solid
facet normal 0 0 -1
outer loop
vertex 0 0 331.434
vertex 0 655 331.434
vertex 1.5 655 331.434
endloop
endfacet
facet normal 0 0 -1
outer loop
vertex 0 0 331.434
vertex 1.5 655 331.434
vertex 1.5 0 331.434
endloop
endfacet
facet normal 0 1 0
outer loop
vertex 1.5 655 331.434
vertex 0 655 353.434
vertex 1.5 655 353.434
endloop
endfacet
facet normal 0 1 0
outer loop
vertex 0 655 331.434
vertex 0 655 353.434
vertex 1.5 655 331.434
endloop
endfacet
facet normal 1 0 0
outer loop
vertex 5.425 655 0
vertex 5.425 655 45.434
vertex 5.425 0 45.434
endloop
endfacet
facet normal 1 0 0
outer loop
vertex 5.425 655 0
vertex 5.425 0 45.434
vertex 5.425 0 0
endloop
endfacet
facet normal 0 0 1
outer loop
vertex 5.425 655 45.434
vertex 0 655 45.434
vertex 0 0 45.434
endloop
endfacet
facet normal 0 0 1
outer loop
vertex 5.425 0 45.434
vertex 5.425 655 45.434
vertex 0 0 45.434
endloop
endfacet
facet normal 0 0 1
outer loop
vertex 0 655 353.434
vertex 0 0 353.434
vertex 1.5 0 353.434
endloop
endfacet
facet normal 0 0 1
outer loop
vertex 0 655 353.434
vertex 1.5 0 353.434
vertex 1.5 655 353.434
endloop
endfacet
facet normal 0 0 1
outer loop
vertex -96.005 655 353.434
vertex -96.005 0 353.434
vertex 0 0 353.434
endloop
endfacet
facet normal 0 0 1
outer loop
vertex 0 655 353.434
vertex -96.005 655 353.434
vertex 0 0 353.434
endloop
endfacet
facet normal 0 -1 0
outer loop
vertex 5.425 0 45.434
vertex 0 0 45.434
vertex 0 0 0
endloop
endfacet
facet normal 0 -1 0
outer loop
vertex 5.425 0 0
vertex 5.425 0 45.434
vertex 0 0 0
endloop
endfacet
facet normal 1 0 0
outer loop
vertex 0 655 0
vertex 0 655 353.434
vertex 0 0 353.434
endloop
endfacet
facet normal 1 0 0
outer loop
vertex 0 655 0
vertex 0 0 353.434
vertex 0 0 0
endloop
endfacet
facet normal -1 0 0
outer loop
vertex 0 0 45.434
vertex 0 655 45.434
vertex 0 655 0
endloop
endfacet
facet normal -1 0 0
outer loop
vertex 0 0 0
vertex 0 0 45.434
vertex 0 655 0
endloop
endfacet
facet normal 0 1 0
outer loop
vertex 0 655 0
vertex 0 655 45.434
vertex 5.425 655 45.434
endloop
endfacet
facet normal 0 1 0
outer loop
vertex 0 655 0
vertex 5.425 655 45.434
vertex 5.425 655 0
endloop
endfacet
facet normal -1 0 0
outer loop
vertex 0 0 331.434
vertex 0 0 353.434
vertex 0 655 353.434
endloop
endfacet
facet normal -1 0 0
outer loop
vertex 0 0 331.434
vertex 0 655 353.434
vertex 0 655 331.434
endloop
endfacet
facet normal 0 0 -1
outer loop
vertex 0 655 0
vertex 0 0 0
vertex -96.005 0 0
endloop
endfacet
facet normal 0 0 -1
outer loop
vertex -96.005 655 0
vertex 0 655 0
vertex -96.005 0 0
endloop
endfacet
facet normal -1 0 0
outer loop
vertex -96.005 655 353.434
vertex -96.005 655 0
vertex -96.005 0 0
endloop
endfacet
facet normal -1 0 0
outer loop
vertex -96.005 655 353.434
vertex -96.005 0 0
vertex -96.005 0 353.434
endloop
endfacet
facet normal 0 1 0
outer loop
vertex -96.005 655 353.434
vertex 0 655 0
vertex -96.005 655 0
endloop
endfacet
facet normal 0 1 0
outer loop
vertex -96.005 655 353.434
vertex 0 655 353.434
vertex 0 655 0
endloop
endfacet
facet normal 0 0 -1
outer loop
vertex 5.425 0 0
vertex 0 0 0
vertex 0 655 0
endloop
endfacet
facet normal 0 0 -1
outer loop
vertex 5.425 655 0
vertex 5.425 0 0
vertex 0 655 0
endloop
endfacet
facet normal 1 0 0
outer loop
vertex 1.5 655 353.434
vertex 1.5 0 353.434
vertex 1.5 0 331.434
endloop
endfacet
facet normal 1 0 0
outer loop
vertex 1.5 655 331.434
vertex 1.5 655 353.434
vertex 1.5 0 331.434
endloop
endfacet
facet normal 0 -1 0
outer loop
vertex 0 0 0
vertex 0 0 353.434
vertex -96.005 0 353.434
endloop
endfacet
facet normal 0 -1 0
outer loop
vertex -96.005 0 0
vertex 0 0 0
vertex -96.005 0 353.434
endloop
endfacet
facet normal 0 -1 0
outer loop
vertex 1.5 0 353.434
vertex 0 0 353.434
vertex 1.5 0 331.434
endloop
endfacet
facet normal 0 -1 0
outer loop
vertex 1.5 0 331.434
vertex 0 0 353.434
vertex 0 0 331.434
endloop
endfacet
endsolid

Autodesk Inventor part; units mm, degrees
ref_plane "YZ Plane" through (0, 0, 0) normal (1, 0, 0) x (0, 1, 0)
sketch "Sketch7" plane through (0, 0, 0) normal (0, 1, 0) x (-1, 0, 0)
  line L0 (0, 0) -> (96.005, 0)
  line L1 (96.005, 0) -> (96.005, 353.434)
  line L2 (96.005, 353.434) -> (0, 353.434)
  line L3 (0, 353.434) -> (0, 0)
  dimension "d17" = 353.434
  dimension "d18" = 96.005
extrude "Extrusion5" add sketch "Sketch7" along normal blind 655
sketch "Sketch8" plane through (0, 0, 353.434) normal (1, 0, 0) x (0, 0, -1)
  line L0 (0, 0) -> (353.434, 0) projected
  line L1 (353.434, 0) -> (353.434, 655) projected
  line L2 (0, 655) -> (353.434, 655) projected
  line L3 (0, 0) -> (0, 655) projected
  line L4 (353.434, 655) -> (308, 655)
  line L5 (308, 655) -> (308, 0)
  line L6 (308, 0) -> (353.434, 0)
  line L7 (22, 0) -> (0, 0)
  line L8 (0, 0) -> (0, 655)
  line L9 (0, 655) -> (22, 655)
  line L10 (22, 655) -> (22, 0)
  dimension "d21" = 45.434
  dimension "d22" = 22
ref_plane "Work Plane16" through (2.425, 613, 26.434) normal (1, 0, 0) x (0, 1, 0)
extrude "Extrusion6" add sketch "Sketch8" along normal up to surface (2.425 mm away) separate body contours L5 L2 L1 L0
extrude "Extrusion7" add sketch "Sketch8" along normal blind 3 from surface at 2.425 contours L5 L2 L1 L0 bodies 2
ref_plane "Work Plane17" through (1.5, 633, 331.434) normal (1, 0, 0) x (0, 1, 0)
extrude "Extrusion8" add sketch "Sketch8" along normal up to surface (1.5 mm away) separate body contours L3 L2 L10 L0
ref_plane "Work Plane18" through (-45.29, 0, 45.434) normal (1, 0, 0) x (0, 0, -1)
ref_plane "Work Plane19" through (-96.005, 0, 176.717) normal (0, 0, 1) x (1, 0, 0)
ref_plane "Work Plane20" through (0, 327.5, 0) normal (0, 1, 0) x (1, 0, 0)
properties part number "TAZ 6 Convex Model"
